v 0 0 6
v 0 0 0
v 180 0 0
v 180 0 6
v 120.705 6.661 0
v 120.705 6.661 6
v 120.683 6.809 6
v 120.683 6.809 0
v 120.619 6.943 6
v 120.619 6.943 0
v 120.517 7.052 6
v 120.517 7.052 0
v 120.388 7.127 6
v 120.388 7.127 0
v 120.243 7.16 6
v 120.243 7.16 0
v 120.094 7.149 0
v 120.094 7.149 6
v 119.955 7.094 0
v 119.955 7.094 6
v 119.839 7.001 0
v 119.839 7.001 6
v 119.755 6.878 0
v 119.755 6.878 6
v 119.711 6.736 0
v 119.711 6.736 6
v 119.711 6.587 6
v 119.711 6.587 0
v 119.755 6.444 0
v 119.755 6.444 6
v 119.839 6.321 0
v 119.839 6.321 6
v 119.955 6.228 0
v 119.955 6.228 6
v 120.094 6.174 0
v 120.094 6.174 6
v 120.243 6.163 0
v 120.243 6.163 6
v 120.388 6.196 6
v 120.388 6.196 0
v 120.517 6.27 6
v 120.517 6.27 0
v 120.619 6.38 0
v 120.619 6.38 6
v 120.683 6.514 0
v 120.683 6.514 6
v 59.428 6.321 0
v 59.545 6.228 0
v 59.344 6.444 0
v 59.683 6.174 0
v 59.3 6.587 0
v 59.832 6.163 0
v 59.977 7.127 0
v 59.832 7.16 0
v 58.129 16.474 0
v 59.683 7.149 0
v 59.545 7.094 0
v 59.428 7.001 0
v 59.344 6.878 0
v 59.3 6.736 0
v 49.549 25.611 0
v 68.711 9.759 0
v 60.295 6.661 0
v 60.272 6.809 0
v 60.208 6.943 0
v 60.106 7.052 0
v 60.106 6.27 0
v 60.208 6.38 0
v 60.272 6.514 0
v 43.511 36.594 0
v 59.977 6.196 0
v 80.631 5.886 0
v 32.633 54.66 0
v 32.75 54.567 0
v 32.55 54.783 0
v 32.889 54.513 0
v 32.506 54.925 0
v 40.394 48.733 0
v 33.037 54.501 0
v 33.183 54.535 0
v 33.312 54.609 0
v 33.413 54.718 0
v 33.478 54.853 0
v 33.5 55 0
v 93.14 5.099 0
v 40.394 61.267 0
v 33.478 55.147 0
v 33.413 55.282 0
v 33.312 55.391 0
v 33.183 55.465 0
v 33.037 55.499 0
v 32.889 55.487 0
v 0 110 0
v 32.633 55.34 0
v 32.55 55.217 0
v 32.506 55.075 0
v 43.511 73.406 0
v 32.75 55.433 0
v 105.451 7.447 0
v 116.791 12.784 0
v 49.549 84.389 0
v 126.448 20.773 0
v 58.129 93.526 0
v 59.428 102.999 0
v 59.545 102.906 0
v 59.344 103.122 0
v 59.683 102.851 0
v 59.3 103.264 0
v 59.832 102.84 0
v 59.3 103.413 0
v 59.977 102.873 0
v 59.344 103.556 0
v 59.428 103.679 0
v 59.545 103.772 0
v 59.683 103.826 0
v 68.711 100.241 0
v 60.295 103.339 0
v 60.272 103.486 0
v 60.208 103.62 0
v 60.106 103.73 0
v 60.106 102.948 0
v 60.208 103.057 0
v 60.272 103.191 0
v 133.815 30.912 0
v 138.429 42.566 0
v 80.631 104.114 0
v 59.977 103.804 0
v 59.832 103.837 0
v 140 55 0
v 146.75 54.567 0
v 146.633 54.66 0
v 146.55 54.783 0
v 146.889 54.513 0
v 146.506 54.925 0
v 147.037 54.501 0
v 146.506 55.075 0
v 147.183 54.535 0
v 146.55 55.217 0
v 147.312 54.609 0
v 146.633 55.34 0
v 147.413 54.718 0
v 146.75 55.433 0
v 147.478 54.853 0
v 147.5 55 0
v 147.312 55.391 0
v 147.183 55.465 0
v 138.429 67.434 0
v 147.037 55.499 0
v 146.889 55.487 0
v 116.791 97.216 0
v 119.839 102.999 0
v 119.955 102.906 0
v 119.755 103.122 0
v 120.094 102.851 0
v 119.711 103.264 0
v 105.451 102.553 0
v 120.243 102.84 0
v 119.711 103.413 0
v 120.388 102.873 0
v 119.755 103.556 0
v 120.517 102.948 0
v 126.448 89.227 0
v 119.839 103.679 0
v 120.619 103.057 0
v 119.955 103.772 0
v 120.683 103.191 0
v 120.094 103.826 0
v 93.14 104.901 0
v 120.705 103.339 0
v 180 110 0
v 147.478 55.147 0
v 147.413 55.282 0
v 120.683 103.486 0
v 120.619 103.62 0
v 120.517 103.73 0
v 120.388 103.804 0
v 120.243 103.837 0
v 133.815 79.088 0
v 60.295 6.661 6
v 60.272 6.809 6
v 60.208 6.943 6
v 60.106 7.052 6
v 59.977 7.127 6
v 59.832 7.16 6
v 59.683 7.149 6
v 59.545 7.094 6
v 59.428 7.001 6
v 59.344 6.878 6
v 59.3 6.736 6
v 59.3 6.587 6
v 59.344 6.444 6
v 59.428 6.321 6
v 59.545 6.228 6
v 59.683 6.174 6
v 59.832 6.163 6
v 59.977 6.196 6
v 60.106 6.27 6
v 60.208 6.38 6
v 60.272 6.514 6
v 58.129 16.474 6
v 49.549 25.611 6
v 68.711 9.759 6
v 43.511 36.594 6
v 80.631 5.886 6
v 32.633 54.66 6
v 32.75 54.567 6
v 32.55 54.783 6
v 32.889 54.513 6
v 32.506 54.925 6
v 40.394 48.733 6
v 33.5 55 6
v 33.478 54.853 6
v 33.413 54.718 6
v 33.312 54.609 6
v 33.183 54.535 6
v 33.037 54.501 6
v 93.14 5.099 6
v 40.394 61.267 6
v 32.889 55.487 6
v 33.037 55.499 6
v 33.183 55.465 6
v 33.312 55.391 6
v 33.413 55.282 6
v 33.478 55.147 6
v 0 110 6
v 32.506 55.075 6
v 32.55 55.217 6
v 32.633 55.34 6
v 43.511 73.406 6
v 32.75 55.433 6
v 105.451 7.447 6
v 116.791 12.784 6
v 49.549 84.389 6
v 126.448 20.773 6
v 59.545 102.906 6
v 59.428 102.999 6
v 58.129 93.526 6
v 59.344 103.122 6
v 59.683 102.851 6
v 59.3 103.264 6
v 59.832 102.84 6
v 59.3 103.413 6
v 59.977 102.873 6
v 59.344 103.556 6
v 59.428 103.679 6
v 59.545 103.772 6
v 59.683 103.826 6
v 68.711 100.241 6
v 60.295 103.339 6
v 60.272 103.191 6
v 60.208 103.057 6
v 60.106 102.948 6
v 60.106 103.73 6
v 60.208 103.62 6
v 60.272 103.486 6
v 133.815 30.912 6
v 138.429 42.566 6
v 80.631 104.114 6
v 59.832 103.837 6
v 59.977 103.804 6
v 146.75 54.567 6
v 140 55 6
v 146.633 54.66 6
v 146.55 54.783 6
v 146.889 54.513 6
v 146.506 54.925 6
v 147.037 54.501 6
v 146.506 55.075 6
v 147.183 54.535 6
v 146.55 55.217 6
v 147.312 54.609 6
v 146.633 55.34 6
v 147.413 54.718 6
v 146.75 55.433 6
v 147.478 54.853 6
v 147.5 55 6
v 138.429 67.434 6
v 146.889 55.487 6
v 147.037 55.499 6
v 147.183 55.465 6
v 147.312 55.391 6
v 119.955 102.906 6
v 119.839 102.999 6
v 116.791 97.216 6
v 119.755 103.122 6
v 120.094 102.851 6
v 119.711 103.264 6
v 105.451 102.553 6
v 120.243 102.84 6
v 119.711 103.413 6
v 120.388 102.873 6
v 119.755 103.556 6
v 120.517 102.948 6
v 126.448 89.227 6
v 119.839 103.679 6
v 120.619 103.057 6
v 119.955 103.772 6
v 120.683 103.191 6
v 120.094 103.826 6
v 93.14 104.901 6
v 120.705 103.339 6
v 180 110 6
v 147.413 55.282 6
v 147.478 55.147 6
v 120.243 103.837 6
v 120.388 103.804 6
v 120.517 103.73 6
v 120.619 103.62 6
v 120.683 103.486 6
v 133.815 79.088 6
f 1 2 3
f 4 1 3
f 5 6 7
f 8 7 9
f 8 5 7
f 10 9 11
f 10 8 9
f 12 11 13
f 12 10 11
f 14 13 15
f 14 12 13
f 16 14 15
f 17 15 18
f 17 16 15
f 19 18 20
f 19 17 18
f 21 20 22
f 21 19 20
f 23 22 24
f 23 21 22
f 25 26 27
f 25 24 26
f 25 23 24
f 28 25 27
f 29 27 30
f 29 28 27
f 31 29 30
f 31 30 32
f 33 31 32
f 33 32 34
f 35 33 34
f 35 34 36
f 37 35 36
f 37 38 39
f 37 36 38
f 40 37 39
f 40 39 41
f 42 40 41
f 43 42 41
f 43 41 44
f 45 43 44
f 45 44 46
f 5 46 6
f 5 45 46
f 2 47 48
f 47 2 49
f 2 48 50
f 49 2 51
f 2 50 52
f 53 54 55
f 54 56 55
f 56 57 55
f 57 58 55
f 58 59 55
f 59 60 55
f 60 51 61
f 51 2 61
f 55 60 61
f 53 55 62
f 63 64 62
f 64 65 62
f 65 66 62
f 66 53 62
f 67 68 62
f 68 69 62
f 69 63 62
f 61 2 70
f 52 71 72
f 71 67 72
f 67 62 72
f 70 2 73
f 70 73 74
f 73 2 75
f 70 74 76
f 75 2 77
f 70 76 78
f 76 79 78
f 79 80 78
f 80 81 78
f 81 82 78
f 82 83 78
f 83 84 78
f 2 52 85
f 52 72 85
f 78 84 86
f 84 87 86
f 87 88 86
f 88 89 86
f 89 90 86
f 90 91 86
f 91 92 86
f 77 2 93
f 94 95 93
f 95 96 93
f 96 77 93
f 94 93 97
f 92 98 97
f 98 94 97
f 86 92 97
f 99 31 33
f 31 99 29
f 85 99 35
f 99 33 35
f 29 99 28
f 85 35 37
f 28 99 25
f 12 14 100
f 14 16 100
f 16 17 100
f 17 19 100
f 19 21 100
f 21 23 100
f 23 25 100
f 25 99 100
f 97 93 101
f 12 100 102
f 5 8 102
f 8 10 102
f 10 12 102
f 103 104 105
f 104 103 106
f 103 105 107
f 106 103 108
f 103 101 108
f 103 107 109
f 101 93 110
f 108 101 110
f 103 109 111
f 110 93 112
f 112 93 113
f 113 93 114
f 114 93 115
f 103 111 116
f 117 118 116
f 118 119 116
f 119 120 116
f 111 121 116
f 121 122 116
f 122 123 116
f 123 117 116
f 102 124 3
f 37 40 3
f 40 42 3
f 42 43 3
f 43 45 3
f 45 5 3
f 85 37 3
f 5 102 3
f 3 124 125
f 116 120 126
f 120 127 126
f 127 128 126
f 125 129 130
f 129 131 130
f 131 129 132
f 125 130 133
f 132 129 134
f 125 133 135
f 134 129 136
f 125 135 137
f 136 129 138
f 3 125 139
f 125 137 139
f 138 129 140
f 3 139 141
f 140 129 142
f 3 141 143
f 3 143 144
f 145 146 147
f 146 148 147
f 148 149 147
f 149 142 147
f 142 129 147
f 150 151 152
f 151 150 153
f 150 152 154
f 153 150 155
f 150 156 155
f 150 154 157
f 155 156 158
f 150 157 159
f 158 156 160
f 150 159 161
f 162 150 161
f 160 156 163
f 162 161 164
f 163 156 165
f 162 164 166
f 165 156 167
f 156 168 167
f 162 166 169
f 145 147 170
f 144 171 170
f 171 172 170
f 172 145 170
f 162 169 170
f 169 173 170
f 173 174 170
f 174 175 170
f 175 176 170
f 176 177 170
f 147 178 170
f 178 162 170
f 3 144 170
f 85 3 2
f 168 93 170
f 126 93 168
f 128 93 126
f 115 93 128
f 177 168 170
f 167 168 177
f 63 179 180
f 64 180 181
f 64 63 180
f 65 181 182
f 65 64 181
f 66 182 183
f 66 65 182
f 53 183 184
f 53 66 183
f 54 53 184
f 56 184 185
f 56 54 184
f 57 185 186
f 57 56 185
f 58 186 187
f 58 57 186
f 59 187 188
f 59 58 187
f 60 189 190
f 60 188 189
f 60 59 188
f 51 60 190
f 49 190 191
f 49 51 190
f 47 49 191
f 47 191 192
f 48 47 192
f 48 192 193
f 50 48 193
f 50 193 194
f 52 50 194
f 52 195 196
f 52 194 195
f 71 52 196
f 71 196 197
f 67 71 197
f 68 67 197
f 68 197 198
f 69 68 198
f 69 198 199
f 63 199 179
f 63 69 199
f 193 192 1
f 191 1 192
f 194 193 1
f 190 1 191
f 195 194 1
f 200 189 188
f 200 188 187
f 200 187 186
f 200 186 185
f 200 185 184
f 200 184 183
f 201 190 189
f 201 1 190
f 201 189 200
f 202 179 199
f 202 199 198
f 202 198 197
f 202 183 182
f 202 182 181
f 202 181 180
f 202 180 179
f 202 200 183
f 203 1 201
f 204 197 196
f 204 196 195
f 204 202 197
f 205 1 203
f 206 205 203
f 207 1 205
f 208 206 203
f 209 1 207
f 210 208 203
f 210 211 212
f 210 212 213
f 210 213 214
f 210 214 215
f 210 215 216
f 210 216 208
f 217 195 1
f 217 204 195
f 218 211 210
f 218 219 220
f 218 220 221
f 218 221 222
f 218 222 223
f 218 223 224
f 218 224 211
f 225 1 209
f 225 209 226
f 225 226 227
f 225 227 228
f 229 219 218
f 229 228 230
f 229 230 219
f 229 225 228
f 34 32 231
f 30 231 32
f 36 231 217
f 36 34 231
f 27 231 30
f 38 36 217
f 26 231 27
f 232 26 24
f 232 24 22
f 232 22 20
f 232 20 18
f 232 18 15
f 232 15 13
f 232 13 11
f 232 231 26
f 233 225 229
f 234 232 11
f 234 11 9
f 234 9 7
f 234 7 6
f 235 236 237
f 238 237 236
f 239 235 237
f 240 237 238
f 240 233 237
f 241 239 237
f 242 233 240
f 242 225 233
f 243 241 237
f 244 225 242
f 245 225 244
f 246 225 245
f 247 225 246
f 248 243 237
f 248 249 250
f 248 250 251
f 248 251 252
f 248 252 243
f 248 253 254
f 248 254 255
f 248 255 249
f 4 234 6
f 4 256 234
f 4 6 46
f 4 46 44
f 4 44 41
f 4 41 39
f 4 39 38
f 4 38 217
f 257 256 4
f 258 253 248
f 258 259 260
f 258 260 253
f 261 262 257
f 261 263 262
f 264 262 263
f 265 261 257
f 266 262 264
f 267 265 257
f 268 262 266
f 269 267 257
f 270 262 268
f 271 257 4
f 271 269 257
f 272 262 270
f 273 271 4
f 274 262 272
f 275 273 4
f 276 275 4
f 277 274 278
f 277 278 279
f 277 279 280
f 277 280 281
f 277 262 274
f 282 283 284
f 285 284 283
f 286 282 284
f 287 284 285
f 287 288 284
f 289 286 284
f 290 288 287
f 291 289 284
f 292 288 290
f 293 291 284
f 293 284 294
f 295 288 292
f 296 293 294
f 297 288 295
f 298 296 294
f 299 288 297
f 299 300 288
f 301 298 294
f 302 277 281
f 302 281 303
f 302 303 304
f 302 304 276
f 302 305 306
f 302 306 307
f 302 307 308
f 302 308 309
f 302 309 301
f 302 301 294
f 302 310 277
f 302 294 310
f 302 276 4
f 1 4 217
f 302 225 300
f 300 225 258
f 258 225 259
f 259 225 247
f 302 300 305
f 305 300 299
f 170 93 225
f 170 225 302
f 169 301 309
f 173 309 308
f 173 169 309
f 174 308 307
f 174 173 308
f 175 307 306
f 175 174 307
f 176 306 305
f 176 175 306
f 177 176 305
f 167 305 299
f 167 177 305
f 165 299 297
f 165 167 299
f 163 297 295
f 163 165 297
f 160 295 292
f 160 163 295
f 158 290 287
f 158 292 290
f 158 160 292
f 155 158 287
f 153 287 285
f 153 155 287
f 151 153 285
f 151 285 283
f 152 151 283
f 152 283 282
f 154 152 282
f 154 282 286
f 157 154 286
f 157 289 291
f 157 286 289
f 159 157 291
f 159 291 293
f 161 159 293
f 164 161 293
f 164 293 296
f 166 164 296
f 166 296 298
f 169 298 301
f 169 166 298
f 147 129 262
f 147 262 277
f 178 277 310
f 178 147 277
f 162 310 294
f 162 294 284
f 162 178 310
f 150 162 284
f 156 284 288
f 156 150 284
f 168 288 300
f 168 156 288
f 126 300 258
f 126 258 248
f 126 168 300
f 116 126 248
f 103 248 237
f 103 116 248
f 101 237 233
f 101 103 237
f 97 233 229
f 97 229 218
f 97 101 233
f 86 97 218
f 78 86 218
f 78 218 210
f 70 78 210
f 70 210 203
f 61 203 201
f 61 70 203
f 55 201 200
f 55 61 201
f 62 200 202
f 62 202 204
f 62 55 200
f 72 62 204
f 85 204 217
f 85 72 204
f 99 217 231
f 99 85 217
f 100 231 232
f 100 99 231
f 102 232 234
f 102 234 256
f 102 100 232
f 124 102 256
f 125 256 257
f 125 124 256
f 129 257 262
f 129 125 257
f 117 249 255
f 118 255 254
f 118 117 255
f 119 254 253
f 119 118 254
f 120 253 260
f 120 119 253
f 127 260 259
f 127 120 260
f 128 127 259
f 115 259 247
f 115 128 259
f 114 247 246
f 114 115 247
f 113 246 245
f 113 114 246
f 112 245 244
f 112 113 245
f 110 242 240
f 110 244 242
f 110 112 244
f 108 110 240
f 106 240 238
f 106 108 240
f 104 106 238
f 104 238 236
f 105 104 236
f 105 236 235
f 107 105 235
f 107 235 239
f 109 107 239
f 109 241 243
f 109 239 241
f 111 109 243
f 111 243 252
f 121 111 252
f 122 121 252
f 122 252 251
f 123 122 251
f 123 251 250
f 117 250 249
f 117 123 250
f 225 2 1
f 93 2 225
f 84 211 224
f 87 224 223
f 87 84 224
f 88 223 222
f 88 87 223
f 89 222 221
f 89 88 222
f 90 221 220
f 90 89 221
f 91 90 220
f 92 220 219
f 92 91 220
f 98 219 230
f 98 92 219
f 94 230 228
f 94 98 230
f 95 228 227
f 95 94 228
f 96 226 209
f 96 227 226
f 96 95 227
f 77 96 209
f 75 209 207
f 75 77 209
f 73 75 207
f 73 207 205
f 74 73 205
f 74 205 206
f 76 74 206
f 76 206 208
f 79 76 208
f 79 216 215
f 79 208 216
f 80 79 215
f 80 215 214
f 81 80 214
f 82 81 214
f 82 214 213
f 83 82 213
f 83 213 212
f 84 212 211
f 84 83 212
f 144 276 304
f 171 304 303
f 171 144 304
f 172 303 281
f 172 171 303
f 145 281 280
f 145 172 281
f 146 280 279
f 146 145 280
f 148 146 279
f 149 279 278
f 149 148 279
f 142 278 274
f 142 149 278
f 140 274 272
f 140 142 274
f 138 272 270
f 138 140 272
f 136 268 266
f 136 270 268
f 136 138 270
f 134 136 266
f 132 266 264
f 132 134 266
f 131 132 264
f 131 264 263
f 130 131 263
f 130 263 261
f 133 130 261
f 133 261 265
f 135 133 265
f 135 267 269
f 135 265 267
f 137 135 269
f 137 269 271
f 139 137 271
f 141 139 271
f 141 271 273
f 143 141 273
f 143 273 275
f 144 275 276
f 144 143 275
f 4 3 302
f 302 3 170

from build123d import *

# Parameters (mm, degrees)
SKETCH1_W           = 180
SKETCH1_H           = 110
BOSS_EXTRUDE1_DEPTH = 6
SKETCH2_R           = 50
CUT_EXTRUDE1_DEPTH  = 6
SKETCH4_R           = 0.5
CUT_EXTRUDE2_DEPTH  = 40


with BuildPart() as part:
    # Sketch1 → Boss-Extrude1 (new body)
    with BuildSketch(Plane.XY):
        with Locations((90, 55)):
            Rectangle(SKETCH1_W, SKETCH1_H)
    extrude(amount=BOSS_EXTRUDE1_DEPTH)

    # Sketch2 → Cut-Extrude1 (cut)
    with BuildSketch(Plane.XY):
        with Locations((90, 55)):
            Circle(SKETCH2_R)
    extrude(amount=CUT_EXTRUDE1_DEPTH, mode=Mode.SUBTRACT)

    # Sketch4 → Cut-Extrude2 (cut)
    with BuildSketch(Plane.XY):
        with Locations((59.794601939, 103.338741481)):
            Circle(SKETCH4_R)
        with Locations((120.205398061, 103.338741481)):
            Circle(SKETCH4_R)
        with Locations((147, 55)):
            Circle(SKETCH4_R)
        with Locations((120.205398061, 6.661258519)):
            Circle(SKETCH4_R)
        with Locations((59.794601939, 6.661258519)):
            Circle(SKETCH4_R)
        with Locations((33, 55)):
            Circle(SKETCH4_R)
    extrude(amount=CUT_EXTRUDE2_DEPTH, mode=Mode.SUBTRACT)


solid = part.part
